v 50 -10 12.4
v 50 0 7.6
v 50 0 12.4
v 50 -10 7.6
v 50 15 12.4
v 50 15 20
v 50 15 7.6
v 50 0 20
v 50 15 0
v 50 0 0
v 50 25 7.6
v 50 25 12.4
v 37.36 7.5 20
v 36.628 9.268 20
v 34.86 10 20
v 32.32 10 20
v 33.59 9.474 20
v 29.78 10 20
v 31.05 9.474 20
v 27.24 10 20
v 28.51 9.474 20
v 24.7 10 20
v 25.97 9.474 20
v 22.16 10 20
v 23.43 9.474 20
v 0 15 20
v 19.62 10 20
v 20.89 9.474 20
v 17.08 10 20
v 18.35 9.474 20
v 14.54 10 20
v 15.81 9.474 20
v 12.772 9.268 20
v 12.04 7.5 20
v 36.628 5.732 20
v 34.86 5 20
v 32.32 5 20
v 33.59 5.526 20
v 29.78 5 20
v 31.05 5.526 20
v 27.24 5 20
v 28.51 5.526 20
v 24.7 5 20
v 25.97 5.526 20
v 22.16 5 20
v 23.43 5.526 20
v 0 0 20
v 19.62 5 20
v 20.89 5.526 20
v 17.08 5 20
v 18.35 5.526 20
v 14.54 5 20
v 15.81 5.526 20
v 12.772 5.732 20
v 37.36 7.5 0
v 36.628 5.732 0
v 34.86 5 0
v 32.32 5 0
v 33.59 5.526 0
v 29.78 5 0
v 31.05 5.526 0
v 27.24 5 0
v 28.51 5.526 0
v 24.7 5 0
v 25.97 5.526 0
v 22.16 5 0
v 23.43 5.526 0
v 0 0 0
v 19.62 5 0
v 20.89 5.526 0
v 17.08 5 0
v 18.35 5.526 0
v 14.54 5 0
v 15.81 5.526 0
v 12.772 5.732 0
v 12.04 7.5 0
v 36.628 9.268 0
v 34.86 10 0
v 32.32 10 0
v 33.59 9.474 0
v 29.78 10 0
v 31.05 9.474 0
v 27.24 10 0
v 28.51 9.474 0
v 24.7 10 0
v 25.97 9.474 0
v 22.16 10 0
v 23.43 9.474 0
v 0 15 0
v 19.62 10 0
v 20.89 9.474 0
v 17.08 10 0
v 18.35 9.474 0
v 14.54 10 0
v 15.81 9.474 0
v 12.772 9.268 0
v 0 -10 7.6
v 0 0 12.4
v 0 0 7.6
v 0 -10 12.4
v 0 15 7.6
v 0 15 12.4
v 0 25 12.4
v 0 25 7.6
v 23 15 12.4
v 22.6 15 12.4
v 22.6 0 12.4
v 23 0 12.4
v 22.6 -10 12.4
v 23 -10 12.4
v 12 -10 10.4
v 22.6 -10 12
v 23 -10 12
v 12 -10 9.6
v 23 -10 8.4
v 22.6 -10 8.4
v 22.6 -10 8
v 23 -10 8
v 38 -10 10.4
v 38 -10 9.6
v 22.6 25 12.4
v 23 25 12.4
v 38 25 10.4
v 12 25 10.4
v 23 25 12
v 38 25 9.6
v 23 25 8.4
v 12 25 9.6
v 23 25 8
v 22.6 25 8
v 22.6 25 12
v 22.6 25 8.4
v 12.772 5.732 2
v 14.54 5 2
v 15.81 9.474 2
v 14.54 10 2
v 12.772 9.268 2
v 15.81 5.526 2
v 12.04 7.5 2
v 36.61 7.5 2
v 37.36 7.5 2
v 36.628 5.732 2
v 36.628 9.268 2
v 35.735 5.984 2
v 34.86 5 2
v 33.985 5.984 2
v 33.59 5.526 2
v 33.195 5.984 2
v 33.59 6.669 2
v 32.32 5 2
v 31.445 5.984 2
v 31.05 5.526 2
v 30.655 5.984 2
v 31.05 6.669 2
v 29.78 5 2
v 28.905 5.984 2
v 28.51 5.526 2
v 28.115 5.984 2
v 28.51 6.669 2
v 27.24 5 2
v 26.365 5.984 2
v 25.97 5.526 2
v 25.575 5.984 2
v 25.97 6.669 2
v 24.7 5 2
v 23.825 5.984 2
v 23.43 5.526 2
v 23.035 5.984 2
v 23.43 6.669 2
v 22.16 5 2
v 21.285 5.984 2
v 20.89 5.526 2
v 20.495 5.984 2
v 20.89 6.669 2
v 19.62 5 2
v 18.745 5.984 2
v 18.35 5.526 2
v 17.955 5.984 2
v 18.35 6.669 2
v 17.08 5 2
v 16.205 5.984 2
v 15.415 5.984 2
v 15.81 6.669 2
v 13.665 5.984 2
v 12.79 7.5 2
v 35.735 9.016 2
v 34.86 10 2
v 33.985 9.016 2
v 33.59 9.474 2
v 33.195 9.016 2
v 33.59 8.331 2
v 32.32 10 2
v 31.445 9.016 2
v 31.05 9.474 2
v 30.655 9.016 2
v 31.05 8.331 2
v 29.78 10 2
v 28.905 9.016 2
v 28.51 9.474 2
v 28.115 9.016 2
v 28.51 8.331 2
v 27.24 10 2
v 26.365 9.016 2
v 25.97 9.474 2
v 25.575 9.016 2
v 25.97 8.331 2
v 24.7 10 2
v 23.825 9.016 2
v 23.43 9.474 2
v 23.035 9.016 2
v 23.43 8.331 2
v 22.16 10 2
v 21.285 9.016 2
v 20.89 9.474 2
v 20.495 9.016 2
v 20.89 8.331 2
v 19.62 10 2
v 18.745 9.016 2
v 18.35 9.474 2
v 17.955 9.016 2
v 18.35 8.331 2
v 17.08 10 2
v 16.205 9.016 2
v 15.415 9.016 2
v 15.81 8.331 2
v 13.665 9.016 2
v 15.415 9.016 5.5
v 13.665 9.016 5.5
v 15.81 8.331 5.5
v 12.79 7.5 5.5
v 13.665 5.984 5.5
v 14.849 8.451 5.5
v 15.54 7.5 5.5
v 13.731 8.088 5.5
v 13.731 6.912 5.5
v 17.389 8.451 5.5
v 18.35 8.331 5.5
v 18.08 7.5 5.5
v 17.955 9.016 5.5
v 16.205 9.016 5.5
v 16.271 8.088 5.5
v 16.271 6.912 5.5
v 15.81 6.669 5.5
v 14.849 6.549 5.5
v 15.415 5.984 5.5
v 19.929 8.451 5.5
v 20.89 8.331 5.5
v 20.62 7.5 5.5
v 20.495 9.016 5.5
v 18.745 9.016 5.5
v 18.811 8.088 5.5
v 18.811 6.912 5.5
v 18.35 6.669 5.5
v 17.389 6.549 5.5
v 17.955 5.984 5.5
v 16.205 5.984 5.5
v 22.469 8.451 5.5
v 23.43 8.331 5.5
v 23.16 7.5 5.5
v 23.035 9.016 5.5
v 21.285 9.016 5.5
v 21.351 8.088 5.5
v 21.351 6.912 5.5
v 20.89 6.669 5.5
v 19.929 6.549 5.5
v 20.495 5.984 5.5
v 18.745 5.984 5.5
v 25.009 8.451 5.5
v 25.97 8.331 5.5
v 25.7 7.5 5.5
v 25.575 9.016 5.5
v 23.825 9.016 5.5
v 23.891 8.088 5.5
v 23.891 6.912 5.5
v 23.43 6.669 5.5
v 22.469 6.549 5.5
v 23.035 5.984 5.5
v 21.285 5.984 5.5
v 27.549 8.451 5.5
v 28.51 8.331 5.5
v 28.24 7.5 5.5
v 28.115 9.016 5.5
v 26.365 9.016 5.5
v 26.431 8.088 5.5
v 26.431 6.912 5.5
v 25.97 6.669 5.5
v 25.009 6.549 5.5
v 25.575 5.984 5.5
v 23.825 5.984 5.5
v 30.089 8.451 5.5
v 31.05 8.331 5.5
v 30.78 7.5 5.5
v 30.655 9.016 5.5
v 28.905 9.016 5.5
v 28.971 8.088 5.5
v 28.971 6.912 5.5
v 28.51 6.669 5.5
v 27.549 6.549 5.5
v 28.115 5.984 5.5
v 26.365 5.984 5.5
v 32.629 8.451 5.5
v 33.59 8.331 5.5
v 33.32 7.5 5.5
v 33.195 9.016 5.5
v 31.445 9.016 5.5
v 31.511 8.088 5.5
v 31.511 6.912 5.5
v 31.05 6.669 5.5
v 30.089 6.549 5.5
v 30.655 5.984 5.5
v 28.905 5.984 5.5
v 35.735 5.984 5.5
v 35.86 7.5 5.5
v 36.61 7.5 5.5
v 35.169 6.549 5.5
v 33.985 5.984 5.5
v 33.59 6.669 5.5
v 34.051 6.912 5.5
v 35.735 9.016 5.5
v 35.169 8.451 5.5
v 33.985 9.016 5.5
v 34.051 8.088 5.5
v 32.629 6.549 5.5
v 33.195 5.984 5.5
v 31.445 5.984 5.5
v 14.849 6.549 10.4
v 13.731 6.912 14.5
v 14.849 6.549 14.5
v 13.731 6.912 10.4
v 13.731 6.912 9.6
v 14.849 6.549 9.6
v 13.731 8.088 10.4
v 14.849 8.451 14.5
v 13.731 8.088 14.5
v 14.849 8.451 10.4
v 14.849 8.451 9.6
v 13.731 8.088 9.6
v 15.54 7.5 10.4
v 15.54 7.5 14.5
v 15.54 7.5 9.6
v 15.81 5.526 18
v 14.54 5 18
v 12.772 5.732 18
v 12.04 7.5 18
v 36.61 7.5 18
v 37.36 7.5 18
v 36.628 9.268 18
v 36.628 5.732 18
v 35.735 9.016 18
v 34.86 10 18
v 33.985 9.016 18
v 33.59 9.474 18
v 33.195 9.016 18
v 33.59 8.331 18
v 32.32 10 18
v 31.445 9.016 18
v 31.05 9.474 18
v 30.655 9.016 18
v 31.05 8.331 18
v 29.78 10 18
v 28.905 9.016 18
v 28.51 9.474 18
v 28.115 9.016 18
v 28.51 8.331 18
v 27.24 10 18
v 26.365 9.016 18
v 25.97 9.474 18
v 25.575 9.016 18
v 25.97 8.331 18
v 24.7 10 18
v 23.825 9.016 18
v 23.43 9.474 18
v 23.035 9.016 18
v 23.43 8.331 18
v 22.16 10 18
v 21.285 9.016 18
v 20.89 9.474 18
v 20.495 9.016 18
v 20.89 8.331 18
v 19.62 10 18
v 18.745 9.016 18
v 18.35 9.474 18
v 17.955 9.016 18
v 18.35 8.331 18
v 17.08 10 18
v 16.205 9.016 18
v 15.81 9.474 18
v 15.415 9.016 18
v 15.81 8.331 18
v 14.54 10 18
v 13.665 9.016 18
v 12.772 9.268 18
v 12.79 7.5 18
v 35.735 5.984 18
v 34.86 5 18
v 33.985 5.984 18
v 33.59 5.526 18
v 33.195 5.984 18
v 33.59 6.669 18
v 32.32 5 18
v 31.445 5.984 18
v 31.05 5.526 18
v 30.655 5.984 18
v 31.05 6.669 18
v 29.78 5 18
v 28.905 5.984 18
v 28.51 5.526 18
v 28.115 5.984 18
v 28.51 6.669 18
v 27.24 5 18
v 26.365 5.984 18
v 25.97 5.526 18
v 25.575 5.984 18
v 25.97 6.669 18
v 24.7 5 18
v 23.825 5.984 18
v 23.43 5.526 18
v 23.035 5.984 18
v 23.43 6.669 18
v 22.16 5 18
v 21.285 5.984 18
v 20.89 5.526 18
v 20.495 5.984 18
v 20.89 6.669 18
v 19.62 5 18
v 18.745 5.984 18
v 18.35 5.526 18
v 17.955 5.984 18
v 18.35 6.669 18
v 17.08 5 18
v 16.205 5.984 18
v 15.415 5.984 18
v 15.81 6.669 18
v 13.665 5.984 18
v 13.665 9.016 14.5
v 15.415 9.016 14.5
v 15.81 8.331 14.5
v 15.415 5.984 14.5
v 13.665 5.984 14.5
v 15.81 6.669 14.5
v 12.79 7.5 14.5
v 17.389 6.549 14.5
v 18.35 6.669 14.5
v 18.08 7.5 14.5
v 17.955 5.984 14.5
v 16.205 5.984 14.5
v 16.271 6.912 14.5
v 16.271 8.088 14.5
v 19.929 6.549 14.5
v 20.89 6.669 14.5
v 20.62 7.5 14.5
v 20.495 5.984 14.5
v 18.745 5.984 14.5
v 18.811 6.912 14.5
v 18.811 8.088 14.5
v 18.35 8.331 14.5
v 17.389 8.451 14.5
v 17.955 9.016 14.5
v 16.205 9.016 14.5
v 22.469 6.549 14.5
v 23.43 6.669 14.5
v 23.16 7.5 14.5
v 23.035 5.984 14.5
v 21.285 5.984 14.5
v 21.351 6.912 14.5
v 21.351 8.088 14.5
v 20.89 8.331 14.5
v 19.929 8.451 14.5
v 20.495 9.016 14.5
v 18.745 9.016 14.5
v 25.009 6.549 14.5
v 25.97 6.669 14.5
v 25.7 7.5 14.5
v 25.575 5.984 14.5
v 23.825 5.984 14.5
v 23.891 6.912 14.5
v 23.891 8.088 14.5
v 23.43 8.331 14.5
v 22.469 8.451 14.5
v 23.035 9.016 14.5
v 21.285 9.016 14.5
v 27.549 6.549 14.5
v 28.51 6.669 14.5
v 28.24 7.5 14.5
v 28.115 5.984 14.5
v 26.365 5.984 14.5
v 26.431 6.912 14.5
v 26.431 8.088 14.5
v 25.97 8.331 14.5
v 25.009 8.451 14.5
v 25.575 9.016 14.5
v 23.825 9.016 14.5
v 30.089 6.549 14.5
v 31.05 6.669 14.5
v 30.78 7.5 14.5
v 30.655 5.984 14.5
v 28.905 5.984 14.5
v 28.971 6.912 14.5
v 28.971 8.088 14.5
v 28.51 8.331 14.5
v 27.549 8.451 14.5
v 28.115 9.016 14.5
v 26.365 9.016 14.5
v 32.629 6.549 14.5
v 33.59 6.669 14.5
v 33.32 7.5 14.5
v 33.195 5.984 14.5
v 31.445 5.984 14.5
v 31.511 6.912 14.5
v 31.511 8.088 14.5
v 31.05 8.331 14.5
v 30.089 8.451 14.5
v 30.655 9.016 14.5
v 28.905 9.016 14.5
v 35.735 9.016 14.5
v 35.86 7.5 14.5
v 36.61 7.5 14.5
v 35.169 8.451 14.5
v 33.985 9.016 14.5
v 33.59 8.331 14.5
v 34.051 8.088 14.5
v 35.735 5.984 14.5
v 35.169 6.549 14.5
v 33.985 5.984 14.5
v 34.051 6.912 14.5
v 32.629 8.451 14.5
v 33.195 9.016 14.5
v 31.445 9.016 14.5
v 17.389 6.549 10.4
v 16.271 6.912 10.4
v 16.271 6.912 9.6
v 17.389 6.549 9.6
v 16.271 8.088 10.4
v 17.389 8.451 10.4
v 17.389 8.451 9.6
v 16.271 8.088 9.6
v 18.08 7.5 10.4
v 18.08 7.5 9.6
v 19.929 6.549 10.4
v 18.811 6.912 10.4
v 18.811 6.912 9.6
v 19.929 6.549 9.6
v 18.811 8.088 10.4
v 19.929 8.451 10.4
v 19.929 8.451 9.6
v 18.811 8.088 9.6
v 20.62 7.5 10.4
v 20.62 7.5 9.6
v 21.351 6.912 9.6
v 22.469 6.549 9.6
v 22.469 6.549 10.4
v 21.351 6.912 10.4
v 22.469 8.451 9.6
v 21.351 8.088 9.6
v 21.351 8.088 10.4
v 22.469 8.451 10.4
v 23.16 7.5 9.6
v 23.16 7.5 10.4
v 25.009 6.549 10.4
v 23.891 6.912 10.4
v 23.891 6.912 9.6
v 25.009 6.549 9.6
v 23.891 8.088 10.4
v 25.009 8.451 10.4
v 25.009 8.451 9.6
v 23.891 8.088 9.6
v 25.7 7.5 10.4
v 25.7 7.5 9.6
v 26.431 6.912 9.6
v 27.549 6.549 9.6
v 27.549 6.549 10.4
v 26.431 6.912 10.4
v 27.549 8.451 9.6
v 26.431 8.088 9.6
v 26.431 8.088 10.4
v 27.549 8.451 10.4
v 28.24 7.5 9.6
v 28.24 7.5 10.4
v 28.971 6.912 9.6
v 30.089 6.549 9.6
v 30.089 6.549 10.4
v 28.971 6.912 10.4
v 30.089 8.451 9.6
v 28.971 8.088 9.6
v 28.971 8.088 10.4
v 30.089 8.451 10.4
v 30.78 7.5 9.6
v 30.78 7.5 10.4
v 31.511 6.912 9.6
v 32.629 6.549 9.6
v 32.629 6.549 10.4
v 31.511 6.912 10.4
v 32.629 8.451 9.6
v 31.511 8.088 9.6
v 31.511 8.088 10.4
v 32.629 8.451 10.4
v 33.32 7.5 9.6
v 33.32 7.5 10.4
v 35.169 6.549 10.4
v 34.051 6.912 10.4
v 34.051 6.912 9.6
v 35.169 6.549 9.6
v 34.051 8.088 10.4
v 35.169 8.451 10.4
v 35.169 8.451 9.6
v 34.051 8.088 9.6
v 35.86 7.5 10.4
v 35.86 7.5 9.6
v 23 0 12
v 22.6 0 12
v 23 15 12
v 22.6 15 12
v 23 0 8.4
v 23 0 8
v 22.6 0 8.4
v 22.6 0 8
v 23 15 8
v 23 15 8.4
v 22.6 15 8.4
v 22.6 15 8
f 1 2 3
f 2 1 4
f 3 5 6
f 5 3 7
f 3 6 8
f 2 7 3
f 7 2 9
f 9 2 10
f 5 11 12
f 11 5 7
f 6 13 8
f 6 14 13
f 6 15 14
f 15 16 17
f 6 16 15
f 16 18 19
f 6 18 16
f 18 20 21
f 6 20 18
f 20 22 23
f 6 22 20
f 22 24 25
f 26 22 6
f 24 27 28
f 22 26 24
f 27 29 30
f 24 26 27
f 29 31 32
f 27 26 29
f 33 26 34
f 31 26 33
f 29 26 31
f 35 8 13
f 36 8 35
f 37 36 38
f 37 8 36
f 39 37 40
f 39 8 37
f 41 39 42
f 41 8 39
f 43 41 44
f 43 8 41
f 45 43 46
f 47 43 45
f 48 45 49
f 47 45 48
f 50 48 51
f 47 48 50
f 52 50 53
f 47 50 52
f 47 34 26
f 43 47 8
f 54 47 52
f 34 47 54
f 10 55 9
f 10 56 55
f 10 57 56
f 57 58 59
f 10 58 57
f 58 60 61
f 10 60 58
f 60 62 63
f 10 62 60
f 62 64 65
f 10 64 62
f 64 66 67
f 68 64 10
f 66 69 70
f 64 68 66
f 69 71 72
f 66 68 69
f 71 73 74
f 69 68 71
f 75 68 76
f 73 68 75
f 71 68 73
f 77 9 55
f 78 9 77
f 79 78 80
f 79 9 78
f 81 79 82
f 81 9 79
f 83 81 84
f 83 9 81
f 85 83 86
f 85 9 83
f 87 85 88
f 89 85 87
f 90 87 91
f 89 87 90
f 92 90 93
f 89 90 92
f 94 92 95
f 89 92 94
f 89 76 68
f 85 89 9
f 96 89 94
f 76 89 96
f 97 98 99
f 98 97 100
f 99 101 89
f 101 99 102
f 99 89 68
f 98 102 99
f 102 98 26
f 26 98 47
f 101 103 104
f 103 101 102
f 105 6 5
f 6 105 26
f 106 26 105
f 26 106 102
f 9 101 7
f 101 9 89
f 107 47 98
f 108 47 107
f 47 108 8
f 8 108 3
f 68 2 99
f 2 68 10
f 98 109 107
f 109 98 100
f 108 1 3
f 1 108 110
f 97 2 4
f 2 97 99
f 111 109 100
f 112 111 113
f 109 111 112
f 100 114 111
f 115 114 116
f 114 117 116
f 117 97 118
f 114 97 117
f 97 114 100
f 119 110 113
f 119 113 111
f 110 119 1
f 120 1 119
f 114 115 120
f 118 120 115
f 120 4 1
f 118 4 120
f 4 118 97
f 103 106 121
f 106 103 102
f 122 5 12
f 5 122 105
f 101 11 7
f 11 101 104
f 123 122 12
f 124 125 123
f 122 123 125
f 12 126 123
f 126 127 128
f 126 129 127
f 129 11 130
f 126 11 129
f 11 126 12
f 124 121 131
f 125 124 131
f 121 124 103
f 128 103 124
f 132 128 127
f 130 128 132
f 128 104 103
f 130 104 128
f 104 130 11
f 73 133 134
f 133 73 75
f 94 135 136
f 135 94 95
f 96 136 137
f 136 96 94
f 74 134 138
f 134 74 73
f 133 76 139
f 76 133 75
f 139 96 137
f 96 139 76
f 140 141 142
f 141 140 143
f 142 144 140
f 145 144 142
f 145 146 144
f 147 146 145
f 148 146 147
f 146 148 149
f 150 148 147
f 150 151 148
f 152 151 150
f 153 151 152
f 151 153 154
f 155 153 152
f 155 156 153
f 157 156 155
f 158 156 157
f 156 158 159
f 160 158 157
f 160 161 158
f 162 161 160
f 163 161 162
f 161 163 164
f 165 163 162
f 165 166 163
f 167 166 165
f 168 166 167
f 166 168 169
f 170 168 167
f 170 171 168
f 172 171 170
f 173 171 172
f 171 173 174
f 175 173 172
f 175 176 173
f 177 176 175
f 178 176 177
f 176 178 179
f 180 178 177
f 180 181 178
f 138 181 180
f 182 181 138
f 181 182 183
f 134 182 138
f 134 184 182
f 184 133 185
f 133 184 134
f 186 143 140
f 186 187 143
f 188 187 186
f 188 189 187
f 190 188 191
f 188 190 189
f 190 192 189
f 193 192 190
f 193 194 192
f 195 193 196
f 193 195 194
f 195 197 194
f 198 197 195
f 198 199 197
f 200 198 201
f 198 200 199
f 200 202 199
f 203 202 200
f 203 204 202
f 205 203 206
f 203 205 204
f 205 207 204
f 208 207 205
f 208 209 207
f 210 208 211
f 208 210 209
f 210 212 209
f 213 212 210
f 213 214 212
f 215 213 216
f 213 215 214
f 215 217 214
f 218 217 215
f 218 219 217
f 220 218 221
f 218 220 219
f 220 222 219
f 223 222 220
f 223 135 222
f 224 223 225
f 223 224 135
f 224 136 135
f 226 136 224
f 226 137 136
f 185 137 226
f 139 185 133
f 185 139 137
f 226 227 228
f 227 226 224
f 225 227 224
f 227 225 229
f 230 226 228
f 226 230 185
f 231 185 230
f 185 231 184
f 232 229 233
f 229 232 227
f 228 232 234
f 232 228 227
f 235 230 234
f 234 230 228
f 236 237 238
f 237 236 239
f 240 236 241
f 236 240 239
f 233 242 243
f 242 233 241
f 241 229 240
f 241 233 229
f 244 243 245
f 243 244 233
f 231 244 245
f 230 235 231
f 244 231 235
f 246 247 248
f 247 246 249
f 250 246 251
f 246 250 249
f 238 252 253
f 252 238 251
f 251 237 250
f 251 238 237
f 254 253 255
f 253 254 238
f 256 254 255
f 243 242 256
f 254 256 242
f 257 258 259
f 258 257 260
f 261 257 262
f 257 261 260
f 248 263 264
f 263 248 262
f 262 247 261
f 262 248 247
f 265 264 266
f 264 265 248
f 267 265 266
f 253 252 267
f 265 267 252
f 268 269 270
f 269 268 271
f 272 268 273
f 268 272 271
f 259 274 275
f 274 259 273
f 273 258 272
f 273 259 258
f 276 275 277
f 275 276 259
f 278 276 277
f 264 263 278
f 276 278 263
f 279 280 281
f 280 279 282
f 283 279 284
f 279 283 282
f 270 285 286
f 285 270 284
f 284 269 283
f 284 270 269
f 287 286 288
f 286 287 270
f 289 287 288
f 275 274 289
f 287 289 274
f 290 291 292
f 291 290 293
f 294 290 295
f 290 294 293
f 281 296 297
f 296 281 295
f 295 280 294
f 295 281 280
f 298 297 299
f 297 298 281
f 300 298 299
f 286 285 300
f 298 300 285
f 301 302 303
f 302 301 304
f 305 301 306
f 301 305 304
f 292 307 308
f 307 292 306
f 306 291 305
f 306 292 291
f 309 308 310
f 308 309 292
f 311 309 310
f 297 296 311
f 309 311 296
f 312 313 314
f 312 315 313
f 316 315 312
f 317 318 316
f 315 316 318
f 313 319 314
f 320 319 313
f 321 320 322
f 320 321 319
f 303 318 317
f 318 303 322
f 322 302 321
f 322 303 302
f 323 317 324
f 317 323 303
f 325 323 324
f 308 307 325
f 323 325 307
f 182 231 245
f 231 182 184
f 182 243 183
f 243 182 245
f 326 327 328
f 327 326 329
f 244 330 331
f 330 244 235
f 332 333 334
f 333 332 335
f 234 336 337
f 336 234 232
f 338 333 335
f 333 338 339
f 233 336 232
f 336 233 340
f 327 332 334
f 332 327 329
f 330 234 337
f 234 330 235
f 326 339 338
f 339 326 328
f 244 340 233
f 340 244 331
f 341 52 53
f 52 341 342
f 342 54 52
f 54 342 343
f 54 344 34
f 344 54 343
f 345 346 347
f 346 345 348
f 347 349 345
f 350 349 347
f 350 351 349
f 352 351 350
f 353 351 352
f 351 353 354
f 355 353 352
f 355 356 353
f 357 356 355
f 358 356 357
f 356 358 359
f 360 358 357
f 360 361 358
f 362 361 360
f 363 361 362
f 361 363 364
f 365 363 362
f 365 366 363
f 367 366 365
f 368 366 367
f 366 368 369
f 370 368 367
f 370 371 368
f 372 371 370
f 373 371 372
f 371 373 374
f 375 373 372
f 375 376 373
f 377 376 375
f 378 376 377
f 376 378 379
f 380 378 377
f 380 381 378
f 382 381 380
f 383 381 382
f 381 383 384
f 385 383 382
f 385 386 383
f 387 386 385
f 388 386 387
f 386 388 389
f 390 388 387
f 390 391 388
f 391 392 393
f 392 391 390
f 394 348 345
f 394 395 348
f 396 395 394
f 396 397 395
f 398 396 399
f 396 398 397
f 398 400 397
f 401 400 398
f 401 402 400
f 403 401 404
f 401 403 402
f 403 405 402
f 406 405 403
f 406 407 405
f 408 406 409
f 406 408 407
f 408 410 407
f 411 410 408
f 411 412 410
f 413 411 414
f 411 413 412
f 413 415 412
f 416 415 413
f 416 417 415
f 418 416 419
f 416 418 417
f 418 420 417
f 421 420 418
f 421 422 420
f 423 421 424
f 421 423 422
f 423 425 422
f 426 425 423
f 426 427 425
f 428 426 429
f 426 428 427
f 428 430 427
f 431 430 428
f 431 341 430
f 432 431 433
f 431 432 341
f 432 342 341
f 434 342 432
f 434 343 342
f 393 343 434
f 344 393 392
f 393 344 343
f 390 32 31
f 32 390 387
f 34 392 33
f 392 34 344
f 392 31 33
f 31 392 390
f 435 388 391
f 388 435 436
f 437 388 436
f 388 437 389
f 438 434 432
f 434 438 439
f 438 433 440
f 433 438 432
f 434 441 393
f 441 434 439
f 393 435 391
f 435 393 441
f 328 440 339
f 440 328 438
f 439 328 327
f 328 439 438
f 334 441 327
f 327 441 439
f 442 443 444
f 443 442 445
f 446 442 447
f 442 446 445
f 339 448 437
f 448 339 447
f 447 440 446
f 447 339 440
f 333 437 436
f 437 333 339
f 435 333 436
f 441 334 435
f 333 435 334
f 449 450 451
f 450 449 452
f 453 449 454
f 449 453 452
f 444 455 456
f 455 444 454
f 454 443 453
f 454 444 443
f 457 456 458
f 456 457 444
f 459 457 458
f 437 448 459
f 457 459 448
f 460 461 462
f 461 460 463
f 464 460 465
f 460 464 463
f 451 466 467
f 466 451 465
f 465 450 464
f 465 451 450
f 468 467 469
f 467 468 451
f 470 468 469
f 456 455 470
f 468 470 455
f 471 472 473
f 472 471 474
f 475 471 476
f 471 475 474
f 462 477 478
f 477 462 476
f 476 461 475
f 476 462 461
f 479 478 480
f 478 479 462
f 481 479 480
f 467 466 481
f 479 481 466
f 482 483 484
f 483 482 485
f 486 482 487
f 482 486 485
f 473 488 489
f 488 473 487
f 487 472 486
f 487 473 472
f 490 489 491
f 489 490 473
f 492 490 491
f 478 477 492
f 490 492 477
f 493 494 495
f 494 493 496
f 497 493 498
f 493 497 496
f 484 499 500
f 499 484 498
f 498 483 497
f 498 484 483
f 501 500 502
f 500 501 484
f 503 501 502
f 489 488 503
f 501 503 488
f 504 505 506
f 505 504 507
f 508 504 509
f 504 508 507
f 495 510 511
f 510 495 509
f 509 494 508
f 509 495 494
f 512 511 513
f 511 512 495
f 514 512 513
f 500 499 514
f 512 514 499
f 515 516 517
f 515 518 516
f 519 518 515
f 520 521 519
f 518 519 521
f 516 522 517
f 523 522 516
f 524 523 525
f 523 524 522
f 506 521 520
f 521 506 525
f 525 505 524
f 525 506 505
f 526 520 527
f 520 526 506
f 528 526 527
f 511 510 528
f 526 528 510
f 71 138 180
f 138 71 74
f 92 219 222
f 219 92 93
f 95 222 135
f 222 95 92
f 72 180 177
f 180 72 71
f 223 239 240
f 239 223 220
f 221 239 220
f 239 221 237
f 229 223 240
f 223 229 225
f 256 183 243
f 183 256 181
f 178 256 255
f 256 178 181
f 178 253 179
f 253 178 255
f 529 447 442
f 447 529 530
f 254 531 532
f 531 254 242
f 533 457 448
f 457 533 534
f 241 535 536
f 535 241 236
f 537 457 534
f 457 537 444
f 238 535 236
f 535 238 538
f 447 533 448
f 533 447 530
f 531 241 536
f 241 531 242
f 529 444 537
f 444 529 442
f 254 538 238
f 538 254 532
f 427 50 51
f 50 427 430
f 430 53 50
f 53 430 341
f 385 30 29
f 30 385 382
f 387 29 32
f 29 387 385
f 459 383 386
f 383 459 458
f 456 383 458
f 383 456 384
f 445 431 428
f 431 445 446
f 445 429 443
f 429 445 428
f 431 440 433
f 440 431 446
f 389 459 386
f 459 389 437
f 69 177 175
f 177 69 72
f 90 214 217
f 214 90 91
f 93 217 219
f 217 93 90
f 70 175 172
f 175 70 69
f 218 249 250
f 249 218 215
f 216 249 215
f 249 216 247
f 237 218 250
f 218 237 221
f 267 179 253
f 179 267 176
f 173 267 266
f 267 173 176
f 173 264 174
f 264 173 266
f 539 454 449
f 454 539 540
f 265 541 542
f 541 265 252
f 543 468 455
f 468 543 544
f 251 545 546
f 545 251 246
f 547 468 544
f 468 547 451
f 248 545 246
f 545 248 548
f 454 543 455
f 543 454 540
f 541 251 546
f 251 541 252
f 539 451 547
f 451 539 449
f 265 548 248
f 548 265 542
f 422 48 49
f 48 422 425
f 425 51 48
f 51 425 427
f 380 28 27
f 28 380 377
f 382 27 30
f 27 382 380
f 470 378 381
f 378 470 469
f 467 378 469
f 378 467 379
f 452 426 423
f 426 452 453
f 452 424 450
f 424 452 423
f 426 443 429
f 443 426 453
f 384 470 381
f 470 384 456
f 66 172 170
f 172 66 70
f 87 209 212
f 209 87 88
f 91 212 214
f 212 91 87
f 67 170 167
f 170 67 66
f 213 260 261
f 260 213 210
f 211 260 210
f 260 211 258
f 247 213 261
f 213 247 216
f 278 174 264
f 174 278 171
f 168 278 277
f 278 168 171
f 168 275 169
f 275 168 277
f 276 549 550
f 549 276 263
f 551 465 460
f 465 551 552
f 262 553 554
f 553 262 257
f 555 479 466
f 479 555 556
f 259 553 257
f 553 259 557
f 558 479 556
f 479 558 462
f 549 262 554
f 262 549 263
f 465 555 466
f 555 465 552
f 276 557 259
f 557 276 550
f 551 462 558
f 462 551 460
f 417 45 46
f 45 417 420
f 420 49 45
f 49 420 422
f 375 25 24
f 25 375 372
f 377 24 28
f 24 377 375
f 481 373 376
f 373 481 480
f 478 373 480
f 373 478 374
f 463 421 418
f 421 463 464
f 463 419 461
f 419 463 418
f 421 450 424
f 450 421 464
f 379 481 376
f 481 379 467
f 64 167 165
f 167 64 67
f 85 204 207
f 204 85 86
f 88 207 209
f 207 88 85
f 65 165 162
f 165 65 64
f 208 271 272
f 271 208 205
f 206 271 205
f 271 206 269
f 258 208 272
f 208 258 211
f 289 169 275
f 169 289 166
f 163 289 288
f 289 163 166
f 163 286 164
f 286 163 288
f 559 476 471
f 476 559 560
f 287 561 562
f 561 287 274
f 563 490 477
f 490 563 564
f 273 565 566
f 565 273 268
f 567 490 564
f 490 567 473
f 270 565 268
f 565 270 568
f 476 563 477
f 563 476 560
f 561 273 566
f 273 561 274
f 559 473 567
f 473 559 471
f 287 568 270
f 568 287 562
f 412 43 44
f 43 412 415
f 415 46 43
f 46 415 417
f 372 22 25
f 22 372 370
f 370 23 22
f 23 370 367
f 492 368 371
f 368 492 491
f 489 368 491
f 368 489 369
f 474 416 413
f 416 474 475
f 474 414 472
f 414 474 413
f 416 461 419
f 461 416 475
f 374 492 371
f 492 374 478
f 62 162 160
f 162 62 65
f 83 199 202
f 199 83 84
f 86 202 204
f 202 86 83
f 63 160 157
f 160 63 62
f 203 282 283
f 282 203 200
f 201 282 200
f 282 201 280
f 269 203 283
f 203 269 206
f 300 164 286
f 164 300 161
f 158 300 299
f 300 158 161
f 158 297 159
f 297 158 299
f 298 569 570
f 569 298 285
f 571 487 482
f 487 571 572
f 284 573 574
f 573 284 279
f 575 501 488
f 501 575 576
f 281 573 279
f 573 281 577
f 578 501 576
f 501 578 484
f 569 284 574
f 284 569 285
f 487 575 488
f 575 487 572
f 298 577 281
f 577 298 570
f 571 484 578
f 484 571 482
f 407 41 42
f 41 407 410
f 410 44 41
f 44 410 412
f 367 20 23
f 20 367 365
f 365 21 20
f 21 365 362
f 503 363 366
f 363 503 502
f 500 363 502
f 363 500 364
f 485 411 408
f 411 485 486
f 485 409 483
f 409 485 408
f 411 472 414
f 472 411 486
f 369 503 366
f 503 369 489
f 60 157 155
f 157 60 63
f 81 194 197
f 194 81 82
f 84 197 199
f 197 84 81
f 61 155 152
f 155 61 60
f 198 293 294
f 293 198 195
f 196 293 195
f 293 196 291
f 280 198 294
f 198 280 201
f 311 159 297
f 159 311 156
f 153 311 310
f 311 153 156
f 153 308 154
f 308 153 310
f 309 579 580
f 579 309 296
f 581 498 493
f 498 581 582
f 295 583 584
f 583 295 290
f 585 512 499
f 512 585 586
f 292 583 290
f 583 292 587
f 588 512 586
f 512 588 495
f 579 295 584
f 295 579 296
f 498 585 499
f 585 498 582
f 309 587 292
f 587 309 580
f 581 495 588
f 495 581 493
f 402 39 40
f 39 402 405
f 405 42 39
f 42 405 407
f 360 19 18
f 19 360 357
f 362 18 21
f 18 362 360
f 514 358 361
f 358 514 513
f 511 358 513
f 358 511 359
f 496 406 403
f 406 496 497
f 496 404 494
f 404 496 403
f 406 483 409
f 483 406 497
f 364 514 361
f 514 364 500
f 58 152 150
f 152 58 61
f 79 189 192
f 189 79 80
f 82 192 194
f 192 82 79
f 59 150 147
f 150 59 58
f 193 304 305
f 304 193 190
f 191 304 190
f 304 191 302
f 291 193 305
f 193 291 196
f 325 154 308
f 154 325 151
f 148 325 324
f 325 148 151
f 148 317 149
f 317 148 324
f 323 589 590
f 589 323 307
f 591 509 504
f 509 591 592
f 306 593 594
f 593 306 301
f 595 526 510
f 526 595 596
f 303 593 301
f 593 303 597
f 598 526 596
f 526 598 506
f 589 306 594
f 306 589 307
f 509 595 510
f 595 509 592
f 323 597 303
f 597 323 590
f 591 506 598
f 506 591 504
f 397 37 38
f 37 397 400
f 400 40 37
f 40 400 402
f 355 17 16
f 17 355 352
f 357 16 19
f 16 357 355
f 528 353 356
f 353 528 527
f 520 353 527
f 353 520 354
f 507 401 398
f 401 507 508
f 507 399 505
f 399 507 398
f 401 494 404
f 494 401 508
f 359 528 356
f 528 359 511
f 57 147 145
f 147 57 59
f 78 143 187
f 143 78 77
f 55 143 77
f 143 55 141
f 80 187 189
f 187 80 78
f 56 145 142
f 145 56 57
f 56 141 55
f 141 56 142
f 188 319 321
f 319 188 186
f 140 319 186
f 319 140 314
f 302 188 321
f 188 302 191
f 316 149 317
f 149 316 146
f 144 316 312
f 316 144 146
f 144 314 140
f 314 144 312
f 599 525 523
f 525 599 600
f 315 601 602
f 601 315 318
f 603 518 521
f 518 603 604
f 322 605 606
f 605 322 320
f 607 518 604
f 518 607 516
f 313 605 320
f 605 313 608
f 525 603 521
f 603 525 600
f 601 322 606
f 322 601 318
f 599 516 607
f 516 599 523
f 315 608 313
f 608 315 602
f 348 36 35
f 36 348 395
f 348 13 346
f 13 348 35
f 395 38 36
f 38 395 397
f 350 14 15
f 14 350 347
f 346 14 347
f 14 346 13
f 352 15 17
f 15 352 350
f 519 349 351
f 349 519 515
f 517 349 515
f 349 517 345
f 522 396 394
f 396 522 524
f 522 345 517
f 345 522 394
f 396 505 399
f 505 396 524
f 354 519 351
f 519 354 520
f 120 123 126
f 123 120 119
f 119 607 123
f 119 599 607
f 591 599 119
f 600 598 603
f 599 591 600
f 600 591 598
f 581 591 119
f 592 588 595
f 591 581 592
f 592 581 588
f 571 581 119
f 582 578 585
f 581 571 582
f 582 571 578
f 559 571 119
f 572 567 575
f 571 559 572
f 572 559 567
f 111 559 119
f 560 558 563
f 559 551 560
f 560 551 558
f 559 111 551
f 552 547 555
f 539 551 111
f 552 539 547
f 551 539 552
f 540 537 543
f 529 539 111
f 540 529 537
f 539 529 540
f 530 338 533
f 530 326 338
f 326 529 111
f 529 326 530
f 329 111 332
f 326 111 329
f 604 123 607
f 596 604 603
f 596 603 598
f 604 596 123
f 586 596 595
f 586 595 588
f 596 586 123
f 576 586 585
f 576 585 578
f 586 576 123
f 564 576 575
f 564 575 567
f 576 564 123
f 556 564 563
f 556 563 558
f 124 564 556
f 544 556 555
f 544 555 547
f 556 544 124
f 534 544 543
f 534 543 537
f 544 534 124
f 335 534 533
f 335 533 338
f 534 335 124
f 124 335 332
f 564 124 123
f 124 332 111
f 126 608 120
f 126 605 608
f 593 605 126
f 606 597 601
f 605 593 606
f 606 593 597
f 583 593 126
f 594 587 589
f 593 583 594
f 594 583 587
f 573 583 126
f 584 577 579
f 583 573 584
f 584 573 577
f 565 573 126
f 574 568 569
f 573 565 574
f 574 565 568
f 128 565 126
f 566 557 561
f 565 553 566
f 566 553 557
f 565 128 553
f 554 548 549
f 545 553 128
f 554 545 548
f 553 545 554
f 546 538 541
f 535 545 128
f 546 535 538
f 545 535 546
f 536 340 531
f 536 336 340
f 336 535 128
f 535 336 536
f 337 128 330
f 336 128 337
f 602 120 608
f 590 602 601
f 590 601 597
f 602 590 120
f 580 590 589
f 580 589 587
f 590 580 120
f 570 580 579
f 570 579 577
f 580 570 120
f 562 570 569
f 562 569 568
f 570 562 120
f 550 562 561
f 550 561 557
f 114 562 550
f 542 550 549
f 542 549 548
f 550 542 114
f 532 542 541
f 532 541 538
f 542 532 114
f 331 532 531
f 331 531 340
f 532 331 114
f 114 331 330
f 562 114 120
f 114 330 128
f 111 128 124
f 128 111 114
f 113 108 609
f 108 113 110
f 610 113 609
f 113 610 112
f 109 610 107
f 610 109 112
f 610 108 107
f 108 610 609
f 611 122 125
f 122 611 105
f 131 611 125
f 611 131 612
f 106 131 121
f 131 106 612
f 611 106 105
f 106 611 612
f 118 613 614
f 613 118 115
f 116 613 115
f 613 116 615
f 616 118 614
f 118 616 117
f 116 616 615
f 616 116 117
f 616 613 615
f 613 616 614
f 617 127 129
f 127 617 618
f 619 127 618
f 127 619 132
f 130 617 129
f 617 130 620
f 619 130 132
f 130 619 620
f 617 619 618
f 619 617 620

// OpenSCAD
led_beam_diam = 2;
led_beam_height = 6;
led_body_diam = 3.5;
led_body_height = 3.5;
led_rand_diam = 5;
led_rand_height = 2;

led_spacing = 2.54;

nr_of_dots = 9;

box_width = 50;
box_depth = 15;
box_height = 20;

slide_width = 26;
slide_height = 0.8;
slide_depth = 10;
slide_thickness = 2;

slide_x = (box_width - slide_width - slide_thickness) / 2;
slide_z = (box_height - slide_height - 2 * slide_thickness) / 2;
slide_outer_width = slide_width + 2 * slide_thickness;

module led(x = 0, y = 0, z = 0)
{
    
    translate([x, y, z])
    {
        // Led rand.
        cylinder(h = led_rand_height, r1 = led_rand_diam / 2, r2 = led_rand_diam / 2);
        
    } 
        
    // Led body.
    translate([x, y, z + led_rand_height])
    {
        cylinder(h = led_body_height, r1 = led_body_diam / 2, r2 = led_body_diam / 2);
    }
        
    // lead beam.
    translate([x, y, z + led_rand_height + led_body_height])
    {
        cylinder(h = led_beam_height, r1 = led_beam_diam / 2, r2 = led_beam_diam / 2);
    }

}

difference()
{
    union()
    { 
        // Main box.
        cube(size = [box_width, box_depth, box_height]);
        
        // Slide left.
        translate([0, -slide_depth, slide_z])
            cube(size = [box_width,
                slide_depth, 
                slide_height + 2 * slide_thickness]);

        // Slide right.
        translate([0, box_depth, slide_z])
            cube(size = [box_width,
                slide_depth, 
                slide_height + 2 * slide_thickness]);
                
    }
    
    slide_x = (box_width - slide_width) / 2;

    // slide opening.
    translate([slide_x,
            -slide_depth, 
            (box_height - slide_height) / 2])
        cube(size = [slide_width, 
            slide_depth + slide_depth + box_depth, slide_height]);
    
    // Row of IR Leds.
    for (x = [slide_x + led_spacing : 2.54 : box_width - slide_x -      led_spacing])
    {
        led(x, box_depth / 2, 0);
        //led_rand_height + led_body_height + led_beam_height);
        
        rotate(a = [180, 0, 0])
            led(x, -(box_depth / 2), -box_height);
        
    }
    
    // Groove for permament dotted line.
    grove_depth = 0.4;
    grove_x = 22.6;
    slide_top = slide_z + slide_thickness + slide_height + slide_thickness;
    slide_bottom = slide_z;
    translate([grove_x, -slide_depth, slide_top - grove_depth])
        cube(size = [grove_depth, slide_depth, grove_depth]);
    translate([grove_x, box_depth, slide_top - grove_depth])
        cube(size = [grove_depth, slide_depth, grove_depth]);

    translate([grove_x, -slide_depth, slide_z + grove_depth])
        cube(size = [grove_depth, slide_depth, grove_depth]);
    translate([grove_x, box_depth, slide_z + grove_depth])
        cube(size = [grove_depth, slide_depth, grove_depth]);

    
}
